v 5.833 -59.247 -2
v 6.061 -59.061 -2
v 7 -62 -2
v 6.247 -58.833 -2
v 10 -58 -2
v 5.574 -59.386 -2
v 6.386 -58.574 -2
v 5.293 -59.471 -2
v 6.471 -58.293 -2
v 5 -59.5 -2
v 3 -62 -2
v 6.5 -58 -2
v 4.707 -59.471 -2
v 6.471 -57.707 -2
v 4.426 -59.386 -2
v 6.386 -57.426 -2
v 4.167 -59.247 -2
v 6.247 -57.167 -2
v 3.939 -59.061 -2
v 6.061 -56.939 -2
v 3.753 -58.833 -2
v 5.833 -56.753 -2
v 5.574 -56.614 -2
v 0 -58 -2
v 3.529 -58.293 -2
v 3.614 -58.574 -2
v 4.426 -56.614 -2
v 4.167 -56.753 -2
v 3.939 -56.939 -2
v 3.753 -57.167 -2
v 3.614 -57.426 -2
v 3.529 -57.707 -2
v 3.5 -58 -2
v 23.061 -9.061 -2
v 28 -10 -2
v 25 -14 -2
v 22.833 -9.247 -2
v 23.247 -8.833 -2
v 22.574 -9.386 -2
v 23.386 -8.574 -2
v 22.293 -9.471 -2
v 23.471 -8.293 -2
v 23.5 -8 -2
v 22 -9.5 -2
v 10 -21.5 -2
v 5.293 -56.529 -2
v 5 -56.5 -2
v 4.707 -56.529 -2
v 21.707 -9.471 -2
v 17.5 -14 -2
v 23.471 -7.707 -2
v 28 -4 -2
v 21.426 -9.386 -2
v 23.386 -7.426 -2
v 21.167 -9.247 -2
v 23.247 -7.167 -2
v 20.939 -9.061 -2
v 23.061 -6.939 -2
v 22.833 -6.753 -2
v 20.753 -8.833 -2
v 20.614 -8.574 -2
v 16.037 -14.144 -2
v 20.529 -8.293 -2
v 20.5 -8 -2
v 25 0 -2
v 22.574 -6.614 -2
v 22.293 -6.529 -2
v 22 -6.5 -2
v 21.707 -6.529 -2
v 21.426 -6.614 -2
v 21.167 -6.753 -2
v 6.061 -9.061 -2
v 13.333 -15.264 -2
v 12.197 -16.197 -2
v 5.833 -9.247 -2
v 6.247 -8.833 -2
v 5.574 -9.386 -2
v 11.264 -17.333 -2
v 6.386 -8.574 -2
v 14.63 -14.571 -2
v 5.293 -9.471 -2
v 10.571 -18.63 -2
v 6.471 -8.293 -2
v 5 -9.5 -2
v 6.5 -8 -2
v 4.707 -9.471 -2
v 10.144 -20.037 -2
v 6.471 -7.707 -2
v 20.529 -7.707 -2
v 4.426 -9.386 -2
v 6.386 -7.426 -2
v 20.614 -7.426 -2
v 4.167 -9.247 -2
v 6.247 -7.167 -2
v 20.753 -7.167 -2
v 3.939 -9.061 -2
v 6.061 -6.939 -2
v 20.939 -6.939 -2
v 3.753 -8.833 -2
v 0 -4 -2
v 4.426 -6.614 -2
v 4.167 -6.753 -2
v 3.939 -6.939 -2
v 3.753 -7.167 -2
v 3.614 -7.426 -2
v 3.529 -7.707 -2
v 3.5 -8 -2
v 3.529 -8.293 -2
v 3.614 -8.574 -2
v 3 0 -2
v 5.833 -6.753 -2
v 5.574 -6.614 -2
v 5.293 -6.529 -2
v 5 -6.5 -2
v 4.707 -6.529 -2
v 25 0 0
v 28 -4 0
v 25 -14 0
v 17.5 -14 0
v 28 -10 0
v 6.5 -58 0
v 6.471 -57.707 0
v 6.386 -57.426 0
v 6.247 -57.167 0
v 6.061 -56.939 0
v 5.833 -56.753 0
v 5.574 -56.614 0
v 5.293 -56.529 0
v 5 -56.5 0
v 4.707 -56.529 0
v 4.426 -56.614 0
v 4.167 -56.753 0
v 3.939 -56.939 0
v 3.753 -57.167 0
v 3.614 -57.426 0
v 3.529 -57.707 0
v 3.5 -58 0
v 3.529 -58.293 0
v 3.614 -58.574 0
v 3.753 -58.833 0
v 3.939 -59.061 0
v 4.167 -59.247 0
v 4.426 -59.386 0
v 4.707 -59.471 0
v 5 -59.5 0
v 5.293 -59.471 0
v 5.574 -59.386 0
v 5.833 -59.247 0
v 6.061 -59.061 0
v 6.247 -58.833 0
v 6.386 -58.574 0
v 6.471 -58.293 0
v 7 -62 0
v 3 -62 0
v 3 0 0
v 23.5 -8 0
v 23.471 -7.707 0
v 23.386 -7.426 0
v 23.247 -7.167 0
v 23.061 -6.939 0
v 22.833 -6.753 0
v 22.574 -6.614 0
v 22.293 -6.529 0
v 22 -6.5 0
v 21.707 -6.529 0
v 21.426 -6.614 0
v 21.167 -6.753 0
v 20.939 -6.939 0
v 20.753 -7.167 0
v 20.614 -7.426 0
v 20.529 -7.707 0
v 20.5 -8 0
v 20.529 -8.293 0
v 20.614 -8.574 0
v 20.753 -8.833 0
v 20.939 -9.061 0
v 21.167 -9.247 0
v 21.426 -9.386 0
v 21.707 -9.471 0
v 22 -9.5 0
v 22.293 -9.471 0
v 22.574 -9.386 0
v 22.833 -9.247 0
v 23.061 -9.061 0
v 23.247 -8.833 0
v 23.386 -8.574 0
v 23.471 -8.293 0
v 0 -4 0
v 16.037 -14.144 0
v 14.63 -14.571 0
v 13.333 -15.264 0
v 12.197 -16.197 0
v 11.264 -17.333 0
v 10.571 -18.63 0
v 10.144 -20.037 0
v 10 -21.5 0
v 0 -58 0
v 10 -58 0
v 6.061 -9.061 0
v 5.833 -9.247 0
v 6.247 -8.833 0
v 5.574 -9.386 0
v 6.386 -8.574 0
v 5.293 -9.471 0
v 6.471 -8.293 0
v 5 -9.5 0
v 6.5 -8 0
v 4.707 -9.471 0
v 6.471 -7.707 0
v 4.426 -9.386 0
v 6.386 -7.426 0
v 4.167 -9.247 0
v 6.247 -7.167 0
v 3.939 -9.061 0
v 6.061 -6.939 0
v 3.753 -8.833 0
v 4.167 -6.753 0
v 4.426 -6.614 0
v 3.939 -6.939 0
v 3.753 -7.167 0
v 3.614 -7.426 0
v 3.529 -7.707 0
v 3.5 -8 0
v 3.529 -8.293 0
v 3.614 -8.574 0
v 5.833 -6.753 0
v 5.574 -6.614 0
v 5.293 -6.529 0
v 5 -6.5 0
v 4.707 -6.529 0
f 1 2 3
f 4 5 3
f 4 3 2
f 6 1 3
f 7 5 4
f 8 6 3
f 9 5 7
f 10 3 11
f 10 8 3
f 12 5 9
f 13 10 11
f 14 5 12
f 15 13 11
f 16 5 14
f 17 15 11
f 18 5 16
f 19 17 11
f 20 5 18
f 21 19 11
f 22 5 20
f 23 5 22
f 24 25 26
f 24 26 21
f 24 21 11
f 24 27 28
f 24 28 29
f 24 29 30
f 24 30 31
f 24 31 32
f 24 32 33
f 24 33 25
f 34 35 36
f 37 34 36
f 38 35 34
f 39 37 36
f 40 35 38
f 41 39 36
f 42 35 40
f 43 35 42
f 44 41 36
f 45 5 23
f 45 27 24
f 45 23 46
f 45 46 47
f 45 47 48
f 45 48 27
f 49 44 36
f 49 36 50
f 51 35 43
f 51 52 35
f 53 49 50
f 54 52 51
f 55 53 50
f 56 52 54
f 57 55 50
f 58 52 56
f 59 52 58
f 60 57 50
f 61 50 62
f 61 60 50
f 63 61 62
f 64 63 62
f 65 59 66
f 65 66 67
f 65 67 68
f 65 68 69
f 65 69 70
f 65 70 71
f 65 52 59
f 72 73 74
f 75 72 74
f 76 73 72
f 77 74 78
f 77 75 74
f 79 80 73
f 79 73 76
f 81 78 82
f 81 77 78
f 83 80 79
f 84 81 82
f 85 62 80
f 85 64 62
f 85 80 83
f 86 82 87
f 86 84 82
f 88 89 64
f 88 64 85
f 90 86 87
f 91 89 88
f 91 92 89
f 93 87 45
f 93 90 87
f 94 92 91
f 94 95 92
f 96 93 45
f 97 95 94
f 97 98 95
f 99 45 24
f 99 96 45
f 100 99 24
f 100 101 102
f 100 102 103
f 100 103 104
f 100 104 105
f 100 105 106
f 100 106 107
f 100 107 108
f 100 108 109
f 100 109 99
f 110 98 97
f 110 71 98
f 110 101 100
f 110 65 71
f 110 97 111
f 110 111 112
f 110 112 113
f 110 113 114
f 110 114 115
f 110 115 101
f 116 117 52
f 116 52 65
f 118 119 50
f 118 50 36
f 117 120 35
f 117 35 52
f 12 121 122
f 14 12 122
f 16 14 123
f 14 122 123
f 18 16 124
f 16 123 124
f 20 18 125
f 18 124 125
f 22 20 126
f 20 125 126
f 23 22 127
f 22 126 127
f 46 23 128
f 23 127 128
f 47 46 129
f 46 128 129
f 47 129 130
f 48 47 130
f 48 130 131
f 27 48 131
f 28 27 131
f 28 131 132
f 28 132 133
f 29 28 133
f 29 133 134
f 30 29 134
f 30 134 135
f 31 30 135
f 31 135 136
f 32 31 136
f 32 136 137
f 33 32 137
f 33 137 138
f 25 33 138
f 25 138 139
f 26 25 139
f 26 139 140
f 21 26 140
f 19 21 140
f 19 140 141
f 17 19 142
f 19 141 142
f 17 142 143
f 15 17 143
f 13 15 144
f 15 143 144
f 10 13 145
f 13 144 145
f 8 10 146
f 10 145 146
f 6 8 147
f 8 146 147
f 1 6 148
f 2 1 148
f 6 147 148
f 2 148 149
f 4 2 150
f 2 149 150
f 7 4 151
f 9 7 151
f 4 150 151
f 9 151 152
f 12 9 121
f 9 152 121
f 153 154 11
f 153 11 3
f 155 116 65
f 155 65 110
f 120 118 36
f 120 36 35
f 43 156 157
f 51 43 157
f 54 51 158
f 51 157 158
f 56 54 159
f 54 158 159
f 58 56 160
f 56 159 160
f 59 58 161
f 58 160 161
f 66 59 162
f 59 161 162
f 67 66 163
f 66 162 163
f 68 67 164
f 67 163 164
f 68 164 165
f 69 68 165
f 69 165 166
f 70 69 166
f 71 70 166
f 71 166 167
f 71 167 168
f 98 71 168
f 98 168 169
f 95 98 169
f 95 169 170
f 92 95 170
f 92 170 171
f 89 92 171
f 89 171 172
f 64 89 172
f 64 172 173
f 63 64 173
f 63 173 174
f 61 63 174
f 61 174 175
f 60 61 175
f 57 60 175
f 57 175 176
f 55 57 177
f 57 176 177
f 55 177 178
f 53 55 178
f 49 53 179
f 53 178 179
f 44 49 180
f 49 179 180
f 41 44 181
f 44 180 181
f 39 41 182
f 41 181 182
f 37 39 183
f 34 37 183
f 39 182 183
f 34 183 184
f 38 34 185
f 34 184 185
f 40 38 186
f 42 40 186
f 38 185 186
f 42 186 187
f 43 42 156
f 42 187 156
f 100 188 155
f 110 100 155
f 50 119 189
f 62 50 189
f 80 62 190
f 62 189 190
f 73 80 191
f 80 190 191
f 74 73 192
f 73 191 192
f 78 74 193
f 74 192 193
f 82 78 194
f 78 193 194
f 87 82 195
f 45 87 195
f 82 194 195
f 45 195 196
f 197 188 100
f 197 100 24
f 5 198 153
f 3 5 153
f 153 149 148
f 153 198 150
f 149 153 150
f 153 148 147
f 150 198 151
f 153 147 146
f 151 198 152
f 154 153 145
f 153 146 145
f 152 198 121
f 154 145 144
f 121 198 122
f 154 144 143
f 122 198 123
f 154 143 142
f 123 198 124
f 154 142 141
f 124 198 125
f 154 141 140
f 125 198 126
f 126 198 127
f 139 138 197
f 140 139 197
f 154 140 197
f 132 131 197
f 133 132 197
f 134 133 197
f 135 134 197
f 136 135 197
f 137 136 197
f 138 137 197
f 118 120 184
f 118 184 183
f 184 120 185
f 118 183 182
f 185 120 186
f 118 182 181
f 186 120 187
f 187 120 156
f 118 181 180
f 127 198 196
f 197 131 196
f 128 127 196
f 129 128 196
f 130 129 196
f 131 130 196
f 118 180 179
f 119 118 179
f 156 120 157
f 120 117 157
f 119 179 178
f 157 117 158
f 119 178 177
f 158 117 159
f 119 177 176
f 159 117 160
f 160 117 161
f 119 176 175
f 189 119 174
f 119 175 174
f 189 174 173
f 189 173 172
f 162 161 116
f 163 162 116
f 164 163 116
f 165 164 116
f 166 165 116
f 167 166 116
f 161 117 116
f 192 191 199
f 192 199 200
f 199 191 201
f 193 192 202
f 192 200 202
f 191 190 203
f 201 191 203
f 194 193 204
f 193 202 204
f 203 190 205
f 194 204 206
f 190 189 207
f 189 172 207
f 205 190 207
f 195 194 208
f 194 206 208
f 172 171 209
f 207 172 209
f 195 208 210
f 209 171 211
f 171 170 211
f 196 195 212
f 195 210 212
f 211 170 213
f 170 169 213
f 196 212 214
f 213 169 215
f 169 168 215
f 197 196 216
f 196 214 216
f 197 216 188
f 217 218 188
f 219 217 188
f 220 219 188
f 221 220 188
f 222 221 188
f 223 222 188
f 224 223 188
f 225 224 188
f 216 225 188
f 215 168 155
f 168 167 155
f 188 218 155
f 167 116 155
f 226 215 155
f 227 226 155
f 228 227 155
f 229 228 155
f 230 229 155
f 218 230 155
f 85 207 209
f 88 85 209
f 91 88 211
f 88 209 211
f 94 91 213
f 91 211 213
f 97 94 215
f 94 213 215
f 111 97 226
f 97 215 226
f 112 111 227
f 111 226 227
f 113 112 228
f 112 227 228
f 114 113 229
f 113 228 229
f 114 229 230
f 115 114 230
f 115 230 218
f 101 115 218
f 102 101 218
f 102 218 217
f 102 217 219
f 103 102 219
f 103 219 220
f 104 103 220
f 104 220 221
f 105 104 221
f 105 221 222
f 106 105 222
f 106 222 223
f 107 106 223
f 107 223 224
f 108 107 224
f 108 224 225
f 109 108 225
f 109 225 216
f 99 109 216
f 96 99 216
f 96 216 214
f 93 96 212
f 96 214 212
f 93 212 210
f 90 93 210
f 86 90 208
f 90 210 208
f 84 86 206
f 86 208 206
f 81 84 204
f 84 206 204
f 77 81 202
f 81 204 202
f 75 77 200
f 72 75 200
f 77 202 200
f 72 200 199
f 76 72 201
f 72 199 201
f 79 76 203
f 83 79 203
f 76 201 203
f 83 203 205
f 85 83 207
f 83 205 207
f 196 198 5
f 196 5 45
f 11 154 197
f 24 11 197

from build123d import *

# Parameters (mm, degrees)
ESTRUSIONE_ESTRUSIONE1_DEPTH = 2
TAGLIO_ESTRUSIONE1_DEPTH     = 69.058798109
SCHIZZO3_R                   = 1.5
TAGLIO_ESTRUSIONE3_DEPTH     = 69.058798109
ESTRUSIONE_ESTRUSIONE2_DEPTH = 2


with BuildPart() as part:
    # Schizzo1 → Estrusione-Estrusione1 (new body)
    with BuildSketch(Plane.XY):
        Polygon((0, 0), (0, -62), (10, -62), (10, -14), (28, -14), (28, 0), align=None)
    extrude(amount=-ESTRUSIONE_ESTRUSIONE1_DEPTH)

    # Schizzo2 → Taglio-Estrusione1 (cut, through all)
    with BuildSketch(Plane.XY):
        Polygon((3, -62), (0, -58), (0, -62), align=None)
        Polygon((10, -58), (7, -62), (10, -62), align=None)
        Polygon((0, -4), (3, 0), (0, 0), align=None)
        Polygon((25, 0), (28, 0), (28, -4), align=None)
        Polygon((28, -14), (25, -14), (28, -10), align=None)
    extrude(amount=-TAGLIO_ESTRUSIONE1_DEPTH, mode=Mode.SUBTRACT)

    # Schizzo3 → Taglio-Estrusione3 (cut, through all)
    with BuildSketch(Plane.XY):
        with Locations((5, -8)):
            Circle(SCHIZZO3_R)
        with Locations((22, -8)):
            Circle(SCHIZZO3_R)
        with Locations((5, -58)):
            Circle(SCHIZZO3_R)
    extrude(amount=-TAGLIO_ESTRUSIONE3_DEPTH, mode=Mode.SUBTRACT)

    # Schizzo4 → Estrusione-Estrusione2 (add)
    with BuildSketch(Plane.XY):
        with BuildLine():
            Line((10, -21.5), (10, -14))
            Line((10, -14), (17.5, -14))
            ThreePointArc((17.5, -14), (12.196699141, -16.196699141), (10, -21.5))
        make_face()
    extrude(amount=-ESTRUSIONE_ESTRUSIONE2_DEPTH)


solid = part.part
